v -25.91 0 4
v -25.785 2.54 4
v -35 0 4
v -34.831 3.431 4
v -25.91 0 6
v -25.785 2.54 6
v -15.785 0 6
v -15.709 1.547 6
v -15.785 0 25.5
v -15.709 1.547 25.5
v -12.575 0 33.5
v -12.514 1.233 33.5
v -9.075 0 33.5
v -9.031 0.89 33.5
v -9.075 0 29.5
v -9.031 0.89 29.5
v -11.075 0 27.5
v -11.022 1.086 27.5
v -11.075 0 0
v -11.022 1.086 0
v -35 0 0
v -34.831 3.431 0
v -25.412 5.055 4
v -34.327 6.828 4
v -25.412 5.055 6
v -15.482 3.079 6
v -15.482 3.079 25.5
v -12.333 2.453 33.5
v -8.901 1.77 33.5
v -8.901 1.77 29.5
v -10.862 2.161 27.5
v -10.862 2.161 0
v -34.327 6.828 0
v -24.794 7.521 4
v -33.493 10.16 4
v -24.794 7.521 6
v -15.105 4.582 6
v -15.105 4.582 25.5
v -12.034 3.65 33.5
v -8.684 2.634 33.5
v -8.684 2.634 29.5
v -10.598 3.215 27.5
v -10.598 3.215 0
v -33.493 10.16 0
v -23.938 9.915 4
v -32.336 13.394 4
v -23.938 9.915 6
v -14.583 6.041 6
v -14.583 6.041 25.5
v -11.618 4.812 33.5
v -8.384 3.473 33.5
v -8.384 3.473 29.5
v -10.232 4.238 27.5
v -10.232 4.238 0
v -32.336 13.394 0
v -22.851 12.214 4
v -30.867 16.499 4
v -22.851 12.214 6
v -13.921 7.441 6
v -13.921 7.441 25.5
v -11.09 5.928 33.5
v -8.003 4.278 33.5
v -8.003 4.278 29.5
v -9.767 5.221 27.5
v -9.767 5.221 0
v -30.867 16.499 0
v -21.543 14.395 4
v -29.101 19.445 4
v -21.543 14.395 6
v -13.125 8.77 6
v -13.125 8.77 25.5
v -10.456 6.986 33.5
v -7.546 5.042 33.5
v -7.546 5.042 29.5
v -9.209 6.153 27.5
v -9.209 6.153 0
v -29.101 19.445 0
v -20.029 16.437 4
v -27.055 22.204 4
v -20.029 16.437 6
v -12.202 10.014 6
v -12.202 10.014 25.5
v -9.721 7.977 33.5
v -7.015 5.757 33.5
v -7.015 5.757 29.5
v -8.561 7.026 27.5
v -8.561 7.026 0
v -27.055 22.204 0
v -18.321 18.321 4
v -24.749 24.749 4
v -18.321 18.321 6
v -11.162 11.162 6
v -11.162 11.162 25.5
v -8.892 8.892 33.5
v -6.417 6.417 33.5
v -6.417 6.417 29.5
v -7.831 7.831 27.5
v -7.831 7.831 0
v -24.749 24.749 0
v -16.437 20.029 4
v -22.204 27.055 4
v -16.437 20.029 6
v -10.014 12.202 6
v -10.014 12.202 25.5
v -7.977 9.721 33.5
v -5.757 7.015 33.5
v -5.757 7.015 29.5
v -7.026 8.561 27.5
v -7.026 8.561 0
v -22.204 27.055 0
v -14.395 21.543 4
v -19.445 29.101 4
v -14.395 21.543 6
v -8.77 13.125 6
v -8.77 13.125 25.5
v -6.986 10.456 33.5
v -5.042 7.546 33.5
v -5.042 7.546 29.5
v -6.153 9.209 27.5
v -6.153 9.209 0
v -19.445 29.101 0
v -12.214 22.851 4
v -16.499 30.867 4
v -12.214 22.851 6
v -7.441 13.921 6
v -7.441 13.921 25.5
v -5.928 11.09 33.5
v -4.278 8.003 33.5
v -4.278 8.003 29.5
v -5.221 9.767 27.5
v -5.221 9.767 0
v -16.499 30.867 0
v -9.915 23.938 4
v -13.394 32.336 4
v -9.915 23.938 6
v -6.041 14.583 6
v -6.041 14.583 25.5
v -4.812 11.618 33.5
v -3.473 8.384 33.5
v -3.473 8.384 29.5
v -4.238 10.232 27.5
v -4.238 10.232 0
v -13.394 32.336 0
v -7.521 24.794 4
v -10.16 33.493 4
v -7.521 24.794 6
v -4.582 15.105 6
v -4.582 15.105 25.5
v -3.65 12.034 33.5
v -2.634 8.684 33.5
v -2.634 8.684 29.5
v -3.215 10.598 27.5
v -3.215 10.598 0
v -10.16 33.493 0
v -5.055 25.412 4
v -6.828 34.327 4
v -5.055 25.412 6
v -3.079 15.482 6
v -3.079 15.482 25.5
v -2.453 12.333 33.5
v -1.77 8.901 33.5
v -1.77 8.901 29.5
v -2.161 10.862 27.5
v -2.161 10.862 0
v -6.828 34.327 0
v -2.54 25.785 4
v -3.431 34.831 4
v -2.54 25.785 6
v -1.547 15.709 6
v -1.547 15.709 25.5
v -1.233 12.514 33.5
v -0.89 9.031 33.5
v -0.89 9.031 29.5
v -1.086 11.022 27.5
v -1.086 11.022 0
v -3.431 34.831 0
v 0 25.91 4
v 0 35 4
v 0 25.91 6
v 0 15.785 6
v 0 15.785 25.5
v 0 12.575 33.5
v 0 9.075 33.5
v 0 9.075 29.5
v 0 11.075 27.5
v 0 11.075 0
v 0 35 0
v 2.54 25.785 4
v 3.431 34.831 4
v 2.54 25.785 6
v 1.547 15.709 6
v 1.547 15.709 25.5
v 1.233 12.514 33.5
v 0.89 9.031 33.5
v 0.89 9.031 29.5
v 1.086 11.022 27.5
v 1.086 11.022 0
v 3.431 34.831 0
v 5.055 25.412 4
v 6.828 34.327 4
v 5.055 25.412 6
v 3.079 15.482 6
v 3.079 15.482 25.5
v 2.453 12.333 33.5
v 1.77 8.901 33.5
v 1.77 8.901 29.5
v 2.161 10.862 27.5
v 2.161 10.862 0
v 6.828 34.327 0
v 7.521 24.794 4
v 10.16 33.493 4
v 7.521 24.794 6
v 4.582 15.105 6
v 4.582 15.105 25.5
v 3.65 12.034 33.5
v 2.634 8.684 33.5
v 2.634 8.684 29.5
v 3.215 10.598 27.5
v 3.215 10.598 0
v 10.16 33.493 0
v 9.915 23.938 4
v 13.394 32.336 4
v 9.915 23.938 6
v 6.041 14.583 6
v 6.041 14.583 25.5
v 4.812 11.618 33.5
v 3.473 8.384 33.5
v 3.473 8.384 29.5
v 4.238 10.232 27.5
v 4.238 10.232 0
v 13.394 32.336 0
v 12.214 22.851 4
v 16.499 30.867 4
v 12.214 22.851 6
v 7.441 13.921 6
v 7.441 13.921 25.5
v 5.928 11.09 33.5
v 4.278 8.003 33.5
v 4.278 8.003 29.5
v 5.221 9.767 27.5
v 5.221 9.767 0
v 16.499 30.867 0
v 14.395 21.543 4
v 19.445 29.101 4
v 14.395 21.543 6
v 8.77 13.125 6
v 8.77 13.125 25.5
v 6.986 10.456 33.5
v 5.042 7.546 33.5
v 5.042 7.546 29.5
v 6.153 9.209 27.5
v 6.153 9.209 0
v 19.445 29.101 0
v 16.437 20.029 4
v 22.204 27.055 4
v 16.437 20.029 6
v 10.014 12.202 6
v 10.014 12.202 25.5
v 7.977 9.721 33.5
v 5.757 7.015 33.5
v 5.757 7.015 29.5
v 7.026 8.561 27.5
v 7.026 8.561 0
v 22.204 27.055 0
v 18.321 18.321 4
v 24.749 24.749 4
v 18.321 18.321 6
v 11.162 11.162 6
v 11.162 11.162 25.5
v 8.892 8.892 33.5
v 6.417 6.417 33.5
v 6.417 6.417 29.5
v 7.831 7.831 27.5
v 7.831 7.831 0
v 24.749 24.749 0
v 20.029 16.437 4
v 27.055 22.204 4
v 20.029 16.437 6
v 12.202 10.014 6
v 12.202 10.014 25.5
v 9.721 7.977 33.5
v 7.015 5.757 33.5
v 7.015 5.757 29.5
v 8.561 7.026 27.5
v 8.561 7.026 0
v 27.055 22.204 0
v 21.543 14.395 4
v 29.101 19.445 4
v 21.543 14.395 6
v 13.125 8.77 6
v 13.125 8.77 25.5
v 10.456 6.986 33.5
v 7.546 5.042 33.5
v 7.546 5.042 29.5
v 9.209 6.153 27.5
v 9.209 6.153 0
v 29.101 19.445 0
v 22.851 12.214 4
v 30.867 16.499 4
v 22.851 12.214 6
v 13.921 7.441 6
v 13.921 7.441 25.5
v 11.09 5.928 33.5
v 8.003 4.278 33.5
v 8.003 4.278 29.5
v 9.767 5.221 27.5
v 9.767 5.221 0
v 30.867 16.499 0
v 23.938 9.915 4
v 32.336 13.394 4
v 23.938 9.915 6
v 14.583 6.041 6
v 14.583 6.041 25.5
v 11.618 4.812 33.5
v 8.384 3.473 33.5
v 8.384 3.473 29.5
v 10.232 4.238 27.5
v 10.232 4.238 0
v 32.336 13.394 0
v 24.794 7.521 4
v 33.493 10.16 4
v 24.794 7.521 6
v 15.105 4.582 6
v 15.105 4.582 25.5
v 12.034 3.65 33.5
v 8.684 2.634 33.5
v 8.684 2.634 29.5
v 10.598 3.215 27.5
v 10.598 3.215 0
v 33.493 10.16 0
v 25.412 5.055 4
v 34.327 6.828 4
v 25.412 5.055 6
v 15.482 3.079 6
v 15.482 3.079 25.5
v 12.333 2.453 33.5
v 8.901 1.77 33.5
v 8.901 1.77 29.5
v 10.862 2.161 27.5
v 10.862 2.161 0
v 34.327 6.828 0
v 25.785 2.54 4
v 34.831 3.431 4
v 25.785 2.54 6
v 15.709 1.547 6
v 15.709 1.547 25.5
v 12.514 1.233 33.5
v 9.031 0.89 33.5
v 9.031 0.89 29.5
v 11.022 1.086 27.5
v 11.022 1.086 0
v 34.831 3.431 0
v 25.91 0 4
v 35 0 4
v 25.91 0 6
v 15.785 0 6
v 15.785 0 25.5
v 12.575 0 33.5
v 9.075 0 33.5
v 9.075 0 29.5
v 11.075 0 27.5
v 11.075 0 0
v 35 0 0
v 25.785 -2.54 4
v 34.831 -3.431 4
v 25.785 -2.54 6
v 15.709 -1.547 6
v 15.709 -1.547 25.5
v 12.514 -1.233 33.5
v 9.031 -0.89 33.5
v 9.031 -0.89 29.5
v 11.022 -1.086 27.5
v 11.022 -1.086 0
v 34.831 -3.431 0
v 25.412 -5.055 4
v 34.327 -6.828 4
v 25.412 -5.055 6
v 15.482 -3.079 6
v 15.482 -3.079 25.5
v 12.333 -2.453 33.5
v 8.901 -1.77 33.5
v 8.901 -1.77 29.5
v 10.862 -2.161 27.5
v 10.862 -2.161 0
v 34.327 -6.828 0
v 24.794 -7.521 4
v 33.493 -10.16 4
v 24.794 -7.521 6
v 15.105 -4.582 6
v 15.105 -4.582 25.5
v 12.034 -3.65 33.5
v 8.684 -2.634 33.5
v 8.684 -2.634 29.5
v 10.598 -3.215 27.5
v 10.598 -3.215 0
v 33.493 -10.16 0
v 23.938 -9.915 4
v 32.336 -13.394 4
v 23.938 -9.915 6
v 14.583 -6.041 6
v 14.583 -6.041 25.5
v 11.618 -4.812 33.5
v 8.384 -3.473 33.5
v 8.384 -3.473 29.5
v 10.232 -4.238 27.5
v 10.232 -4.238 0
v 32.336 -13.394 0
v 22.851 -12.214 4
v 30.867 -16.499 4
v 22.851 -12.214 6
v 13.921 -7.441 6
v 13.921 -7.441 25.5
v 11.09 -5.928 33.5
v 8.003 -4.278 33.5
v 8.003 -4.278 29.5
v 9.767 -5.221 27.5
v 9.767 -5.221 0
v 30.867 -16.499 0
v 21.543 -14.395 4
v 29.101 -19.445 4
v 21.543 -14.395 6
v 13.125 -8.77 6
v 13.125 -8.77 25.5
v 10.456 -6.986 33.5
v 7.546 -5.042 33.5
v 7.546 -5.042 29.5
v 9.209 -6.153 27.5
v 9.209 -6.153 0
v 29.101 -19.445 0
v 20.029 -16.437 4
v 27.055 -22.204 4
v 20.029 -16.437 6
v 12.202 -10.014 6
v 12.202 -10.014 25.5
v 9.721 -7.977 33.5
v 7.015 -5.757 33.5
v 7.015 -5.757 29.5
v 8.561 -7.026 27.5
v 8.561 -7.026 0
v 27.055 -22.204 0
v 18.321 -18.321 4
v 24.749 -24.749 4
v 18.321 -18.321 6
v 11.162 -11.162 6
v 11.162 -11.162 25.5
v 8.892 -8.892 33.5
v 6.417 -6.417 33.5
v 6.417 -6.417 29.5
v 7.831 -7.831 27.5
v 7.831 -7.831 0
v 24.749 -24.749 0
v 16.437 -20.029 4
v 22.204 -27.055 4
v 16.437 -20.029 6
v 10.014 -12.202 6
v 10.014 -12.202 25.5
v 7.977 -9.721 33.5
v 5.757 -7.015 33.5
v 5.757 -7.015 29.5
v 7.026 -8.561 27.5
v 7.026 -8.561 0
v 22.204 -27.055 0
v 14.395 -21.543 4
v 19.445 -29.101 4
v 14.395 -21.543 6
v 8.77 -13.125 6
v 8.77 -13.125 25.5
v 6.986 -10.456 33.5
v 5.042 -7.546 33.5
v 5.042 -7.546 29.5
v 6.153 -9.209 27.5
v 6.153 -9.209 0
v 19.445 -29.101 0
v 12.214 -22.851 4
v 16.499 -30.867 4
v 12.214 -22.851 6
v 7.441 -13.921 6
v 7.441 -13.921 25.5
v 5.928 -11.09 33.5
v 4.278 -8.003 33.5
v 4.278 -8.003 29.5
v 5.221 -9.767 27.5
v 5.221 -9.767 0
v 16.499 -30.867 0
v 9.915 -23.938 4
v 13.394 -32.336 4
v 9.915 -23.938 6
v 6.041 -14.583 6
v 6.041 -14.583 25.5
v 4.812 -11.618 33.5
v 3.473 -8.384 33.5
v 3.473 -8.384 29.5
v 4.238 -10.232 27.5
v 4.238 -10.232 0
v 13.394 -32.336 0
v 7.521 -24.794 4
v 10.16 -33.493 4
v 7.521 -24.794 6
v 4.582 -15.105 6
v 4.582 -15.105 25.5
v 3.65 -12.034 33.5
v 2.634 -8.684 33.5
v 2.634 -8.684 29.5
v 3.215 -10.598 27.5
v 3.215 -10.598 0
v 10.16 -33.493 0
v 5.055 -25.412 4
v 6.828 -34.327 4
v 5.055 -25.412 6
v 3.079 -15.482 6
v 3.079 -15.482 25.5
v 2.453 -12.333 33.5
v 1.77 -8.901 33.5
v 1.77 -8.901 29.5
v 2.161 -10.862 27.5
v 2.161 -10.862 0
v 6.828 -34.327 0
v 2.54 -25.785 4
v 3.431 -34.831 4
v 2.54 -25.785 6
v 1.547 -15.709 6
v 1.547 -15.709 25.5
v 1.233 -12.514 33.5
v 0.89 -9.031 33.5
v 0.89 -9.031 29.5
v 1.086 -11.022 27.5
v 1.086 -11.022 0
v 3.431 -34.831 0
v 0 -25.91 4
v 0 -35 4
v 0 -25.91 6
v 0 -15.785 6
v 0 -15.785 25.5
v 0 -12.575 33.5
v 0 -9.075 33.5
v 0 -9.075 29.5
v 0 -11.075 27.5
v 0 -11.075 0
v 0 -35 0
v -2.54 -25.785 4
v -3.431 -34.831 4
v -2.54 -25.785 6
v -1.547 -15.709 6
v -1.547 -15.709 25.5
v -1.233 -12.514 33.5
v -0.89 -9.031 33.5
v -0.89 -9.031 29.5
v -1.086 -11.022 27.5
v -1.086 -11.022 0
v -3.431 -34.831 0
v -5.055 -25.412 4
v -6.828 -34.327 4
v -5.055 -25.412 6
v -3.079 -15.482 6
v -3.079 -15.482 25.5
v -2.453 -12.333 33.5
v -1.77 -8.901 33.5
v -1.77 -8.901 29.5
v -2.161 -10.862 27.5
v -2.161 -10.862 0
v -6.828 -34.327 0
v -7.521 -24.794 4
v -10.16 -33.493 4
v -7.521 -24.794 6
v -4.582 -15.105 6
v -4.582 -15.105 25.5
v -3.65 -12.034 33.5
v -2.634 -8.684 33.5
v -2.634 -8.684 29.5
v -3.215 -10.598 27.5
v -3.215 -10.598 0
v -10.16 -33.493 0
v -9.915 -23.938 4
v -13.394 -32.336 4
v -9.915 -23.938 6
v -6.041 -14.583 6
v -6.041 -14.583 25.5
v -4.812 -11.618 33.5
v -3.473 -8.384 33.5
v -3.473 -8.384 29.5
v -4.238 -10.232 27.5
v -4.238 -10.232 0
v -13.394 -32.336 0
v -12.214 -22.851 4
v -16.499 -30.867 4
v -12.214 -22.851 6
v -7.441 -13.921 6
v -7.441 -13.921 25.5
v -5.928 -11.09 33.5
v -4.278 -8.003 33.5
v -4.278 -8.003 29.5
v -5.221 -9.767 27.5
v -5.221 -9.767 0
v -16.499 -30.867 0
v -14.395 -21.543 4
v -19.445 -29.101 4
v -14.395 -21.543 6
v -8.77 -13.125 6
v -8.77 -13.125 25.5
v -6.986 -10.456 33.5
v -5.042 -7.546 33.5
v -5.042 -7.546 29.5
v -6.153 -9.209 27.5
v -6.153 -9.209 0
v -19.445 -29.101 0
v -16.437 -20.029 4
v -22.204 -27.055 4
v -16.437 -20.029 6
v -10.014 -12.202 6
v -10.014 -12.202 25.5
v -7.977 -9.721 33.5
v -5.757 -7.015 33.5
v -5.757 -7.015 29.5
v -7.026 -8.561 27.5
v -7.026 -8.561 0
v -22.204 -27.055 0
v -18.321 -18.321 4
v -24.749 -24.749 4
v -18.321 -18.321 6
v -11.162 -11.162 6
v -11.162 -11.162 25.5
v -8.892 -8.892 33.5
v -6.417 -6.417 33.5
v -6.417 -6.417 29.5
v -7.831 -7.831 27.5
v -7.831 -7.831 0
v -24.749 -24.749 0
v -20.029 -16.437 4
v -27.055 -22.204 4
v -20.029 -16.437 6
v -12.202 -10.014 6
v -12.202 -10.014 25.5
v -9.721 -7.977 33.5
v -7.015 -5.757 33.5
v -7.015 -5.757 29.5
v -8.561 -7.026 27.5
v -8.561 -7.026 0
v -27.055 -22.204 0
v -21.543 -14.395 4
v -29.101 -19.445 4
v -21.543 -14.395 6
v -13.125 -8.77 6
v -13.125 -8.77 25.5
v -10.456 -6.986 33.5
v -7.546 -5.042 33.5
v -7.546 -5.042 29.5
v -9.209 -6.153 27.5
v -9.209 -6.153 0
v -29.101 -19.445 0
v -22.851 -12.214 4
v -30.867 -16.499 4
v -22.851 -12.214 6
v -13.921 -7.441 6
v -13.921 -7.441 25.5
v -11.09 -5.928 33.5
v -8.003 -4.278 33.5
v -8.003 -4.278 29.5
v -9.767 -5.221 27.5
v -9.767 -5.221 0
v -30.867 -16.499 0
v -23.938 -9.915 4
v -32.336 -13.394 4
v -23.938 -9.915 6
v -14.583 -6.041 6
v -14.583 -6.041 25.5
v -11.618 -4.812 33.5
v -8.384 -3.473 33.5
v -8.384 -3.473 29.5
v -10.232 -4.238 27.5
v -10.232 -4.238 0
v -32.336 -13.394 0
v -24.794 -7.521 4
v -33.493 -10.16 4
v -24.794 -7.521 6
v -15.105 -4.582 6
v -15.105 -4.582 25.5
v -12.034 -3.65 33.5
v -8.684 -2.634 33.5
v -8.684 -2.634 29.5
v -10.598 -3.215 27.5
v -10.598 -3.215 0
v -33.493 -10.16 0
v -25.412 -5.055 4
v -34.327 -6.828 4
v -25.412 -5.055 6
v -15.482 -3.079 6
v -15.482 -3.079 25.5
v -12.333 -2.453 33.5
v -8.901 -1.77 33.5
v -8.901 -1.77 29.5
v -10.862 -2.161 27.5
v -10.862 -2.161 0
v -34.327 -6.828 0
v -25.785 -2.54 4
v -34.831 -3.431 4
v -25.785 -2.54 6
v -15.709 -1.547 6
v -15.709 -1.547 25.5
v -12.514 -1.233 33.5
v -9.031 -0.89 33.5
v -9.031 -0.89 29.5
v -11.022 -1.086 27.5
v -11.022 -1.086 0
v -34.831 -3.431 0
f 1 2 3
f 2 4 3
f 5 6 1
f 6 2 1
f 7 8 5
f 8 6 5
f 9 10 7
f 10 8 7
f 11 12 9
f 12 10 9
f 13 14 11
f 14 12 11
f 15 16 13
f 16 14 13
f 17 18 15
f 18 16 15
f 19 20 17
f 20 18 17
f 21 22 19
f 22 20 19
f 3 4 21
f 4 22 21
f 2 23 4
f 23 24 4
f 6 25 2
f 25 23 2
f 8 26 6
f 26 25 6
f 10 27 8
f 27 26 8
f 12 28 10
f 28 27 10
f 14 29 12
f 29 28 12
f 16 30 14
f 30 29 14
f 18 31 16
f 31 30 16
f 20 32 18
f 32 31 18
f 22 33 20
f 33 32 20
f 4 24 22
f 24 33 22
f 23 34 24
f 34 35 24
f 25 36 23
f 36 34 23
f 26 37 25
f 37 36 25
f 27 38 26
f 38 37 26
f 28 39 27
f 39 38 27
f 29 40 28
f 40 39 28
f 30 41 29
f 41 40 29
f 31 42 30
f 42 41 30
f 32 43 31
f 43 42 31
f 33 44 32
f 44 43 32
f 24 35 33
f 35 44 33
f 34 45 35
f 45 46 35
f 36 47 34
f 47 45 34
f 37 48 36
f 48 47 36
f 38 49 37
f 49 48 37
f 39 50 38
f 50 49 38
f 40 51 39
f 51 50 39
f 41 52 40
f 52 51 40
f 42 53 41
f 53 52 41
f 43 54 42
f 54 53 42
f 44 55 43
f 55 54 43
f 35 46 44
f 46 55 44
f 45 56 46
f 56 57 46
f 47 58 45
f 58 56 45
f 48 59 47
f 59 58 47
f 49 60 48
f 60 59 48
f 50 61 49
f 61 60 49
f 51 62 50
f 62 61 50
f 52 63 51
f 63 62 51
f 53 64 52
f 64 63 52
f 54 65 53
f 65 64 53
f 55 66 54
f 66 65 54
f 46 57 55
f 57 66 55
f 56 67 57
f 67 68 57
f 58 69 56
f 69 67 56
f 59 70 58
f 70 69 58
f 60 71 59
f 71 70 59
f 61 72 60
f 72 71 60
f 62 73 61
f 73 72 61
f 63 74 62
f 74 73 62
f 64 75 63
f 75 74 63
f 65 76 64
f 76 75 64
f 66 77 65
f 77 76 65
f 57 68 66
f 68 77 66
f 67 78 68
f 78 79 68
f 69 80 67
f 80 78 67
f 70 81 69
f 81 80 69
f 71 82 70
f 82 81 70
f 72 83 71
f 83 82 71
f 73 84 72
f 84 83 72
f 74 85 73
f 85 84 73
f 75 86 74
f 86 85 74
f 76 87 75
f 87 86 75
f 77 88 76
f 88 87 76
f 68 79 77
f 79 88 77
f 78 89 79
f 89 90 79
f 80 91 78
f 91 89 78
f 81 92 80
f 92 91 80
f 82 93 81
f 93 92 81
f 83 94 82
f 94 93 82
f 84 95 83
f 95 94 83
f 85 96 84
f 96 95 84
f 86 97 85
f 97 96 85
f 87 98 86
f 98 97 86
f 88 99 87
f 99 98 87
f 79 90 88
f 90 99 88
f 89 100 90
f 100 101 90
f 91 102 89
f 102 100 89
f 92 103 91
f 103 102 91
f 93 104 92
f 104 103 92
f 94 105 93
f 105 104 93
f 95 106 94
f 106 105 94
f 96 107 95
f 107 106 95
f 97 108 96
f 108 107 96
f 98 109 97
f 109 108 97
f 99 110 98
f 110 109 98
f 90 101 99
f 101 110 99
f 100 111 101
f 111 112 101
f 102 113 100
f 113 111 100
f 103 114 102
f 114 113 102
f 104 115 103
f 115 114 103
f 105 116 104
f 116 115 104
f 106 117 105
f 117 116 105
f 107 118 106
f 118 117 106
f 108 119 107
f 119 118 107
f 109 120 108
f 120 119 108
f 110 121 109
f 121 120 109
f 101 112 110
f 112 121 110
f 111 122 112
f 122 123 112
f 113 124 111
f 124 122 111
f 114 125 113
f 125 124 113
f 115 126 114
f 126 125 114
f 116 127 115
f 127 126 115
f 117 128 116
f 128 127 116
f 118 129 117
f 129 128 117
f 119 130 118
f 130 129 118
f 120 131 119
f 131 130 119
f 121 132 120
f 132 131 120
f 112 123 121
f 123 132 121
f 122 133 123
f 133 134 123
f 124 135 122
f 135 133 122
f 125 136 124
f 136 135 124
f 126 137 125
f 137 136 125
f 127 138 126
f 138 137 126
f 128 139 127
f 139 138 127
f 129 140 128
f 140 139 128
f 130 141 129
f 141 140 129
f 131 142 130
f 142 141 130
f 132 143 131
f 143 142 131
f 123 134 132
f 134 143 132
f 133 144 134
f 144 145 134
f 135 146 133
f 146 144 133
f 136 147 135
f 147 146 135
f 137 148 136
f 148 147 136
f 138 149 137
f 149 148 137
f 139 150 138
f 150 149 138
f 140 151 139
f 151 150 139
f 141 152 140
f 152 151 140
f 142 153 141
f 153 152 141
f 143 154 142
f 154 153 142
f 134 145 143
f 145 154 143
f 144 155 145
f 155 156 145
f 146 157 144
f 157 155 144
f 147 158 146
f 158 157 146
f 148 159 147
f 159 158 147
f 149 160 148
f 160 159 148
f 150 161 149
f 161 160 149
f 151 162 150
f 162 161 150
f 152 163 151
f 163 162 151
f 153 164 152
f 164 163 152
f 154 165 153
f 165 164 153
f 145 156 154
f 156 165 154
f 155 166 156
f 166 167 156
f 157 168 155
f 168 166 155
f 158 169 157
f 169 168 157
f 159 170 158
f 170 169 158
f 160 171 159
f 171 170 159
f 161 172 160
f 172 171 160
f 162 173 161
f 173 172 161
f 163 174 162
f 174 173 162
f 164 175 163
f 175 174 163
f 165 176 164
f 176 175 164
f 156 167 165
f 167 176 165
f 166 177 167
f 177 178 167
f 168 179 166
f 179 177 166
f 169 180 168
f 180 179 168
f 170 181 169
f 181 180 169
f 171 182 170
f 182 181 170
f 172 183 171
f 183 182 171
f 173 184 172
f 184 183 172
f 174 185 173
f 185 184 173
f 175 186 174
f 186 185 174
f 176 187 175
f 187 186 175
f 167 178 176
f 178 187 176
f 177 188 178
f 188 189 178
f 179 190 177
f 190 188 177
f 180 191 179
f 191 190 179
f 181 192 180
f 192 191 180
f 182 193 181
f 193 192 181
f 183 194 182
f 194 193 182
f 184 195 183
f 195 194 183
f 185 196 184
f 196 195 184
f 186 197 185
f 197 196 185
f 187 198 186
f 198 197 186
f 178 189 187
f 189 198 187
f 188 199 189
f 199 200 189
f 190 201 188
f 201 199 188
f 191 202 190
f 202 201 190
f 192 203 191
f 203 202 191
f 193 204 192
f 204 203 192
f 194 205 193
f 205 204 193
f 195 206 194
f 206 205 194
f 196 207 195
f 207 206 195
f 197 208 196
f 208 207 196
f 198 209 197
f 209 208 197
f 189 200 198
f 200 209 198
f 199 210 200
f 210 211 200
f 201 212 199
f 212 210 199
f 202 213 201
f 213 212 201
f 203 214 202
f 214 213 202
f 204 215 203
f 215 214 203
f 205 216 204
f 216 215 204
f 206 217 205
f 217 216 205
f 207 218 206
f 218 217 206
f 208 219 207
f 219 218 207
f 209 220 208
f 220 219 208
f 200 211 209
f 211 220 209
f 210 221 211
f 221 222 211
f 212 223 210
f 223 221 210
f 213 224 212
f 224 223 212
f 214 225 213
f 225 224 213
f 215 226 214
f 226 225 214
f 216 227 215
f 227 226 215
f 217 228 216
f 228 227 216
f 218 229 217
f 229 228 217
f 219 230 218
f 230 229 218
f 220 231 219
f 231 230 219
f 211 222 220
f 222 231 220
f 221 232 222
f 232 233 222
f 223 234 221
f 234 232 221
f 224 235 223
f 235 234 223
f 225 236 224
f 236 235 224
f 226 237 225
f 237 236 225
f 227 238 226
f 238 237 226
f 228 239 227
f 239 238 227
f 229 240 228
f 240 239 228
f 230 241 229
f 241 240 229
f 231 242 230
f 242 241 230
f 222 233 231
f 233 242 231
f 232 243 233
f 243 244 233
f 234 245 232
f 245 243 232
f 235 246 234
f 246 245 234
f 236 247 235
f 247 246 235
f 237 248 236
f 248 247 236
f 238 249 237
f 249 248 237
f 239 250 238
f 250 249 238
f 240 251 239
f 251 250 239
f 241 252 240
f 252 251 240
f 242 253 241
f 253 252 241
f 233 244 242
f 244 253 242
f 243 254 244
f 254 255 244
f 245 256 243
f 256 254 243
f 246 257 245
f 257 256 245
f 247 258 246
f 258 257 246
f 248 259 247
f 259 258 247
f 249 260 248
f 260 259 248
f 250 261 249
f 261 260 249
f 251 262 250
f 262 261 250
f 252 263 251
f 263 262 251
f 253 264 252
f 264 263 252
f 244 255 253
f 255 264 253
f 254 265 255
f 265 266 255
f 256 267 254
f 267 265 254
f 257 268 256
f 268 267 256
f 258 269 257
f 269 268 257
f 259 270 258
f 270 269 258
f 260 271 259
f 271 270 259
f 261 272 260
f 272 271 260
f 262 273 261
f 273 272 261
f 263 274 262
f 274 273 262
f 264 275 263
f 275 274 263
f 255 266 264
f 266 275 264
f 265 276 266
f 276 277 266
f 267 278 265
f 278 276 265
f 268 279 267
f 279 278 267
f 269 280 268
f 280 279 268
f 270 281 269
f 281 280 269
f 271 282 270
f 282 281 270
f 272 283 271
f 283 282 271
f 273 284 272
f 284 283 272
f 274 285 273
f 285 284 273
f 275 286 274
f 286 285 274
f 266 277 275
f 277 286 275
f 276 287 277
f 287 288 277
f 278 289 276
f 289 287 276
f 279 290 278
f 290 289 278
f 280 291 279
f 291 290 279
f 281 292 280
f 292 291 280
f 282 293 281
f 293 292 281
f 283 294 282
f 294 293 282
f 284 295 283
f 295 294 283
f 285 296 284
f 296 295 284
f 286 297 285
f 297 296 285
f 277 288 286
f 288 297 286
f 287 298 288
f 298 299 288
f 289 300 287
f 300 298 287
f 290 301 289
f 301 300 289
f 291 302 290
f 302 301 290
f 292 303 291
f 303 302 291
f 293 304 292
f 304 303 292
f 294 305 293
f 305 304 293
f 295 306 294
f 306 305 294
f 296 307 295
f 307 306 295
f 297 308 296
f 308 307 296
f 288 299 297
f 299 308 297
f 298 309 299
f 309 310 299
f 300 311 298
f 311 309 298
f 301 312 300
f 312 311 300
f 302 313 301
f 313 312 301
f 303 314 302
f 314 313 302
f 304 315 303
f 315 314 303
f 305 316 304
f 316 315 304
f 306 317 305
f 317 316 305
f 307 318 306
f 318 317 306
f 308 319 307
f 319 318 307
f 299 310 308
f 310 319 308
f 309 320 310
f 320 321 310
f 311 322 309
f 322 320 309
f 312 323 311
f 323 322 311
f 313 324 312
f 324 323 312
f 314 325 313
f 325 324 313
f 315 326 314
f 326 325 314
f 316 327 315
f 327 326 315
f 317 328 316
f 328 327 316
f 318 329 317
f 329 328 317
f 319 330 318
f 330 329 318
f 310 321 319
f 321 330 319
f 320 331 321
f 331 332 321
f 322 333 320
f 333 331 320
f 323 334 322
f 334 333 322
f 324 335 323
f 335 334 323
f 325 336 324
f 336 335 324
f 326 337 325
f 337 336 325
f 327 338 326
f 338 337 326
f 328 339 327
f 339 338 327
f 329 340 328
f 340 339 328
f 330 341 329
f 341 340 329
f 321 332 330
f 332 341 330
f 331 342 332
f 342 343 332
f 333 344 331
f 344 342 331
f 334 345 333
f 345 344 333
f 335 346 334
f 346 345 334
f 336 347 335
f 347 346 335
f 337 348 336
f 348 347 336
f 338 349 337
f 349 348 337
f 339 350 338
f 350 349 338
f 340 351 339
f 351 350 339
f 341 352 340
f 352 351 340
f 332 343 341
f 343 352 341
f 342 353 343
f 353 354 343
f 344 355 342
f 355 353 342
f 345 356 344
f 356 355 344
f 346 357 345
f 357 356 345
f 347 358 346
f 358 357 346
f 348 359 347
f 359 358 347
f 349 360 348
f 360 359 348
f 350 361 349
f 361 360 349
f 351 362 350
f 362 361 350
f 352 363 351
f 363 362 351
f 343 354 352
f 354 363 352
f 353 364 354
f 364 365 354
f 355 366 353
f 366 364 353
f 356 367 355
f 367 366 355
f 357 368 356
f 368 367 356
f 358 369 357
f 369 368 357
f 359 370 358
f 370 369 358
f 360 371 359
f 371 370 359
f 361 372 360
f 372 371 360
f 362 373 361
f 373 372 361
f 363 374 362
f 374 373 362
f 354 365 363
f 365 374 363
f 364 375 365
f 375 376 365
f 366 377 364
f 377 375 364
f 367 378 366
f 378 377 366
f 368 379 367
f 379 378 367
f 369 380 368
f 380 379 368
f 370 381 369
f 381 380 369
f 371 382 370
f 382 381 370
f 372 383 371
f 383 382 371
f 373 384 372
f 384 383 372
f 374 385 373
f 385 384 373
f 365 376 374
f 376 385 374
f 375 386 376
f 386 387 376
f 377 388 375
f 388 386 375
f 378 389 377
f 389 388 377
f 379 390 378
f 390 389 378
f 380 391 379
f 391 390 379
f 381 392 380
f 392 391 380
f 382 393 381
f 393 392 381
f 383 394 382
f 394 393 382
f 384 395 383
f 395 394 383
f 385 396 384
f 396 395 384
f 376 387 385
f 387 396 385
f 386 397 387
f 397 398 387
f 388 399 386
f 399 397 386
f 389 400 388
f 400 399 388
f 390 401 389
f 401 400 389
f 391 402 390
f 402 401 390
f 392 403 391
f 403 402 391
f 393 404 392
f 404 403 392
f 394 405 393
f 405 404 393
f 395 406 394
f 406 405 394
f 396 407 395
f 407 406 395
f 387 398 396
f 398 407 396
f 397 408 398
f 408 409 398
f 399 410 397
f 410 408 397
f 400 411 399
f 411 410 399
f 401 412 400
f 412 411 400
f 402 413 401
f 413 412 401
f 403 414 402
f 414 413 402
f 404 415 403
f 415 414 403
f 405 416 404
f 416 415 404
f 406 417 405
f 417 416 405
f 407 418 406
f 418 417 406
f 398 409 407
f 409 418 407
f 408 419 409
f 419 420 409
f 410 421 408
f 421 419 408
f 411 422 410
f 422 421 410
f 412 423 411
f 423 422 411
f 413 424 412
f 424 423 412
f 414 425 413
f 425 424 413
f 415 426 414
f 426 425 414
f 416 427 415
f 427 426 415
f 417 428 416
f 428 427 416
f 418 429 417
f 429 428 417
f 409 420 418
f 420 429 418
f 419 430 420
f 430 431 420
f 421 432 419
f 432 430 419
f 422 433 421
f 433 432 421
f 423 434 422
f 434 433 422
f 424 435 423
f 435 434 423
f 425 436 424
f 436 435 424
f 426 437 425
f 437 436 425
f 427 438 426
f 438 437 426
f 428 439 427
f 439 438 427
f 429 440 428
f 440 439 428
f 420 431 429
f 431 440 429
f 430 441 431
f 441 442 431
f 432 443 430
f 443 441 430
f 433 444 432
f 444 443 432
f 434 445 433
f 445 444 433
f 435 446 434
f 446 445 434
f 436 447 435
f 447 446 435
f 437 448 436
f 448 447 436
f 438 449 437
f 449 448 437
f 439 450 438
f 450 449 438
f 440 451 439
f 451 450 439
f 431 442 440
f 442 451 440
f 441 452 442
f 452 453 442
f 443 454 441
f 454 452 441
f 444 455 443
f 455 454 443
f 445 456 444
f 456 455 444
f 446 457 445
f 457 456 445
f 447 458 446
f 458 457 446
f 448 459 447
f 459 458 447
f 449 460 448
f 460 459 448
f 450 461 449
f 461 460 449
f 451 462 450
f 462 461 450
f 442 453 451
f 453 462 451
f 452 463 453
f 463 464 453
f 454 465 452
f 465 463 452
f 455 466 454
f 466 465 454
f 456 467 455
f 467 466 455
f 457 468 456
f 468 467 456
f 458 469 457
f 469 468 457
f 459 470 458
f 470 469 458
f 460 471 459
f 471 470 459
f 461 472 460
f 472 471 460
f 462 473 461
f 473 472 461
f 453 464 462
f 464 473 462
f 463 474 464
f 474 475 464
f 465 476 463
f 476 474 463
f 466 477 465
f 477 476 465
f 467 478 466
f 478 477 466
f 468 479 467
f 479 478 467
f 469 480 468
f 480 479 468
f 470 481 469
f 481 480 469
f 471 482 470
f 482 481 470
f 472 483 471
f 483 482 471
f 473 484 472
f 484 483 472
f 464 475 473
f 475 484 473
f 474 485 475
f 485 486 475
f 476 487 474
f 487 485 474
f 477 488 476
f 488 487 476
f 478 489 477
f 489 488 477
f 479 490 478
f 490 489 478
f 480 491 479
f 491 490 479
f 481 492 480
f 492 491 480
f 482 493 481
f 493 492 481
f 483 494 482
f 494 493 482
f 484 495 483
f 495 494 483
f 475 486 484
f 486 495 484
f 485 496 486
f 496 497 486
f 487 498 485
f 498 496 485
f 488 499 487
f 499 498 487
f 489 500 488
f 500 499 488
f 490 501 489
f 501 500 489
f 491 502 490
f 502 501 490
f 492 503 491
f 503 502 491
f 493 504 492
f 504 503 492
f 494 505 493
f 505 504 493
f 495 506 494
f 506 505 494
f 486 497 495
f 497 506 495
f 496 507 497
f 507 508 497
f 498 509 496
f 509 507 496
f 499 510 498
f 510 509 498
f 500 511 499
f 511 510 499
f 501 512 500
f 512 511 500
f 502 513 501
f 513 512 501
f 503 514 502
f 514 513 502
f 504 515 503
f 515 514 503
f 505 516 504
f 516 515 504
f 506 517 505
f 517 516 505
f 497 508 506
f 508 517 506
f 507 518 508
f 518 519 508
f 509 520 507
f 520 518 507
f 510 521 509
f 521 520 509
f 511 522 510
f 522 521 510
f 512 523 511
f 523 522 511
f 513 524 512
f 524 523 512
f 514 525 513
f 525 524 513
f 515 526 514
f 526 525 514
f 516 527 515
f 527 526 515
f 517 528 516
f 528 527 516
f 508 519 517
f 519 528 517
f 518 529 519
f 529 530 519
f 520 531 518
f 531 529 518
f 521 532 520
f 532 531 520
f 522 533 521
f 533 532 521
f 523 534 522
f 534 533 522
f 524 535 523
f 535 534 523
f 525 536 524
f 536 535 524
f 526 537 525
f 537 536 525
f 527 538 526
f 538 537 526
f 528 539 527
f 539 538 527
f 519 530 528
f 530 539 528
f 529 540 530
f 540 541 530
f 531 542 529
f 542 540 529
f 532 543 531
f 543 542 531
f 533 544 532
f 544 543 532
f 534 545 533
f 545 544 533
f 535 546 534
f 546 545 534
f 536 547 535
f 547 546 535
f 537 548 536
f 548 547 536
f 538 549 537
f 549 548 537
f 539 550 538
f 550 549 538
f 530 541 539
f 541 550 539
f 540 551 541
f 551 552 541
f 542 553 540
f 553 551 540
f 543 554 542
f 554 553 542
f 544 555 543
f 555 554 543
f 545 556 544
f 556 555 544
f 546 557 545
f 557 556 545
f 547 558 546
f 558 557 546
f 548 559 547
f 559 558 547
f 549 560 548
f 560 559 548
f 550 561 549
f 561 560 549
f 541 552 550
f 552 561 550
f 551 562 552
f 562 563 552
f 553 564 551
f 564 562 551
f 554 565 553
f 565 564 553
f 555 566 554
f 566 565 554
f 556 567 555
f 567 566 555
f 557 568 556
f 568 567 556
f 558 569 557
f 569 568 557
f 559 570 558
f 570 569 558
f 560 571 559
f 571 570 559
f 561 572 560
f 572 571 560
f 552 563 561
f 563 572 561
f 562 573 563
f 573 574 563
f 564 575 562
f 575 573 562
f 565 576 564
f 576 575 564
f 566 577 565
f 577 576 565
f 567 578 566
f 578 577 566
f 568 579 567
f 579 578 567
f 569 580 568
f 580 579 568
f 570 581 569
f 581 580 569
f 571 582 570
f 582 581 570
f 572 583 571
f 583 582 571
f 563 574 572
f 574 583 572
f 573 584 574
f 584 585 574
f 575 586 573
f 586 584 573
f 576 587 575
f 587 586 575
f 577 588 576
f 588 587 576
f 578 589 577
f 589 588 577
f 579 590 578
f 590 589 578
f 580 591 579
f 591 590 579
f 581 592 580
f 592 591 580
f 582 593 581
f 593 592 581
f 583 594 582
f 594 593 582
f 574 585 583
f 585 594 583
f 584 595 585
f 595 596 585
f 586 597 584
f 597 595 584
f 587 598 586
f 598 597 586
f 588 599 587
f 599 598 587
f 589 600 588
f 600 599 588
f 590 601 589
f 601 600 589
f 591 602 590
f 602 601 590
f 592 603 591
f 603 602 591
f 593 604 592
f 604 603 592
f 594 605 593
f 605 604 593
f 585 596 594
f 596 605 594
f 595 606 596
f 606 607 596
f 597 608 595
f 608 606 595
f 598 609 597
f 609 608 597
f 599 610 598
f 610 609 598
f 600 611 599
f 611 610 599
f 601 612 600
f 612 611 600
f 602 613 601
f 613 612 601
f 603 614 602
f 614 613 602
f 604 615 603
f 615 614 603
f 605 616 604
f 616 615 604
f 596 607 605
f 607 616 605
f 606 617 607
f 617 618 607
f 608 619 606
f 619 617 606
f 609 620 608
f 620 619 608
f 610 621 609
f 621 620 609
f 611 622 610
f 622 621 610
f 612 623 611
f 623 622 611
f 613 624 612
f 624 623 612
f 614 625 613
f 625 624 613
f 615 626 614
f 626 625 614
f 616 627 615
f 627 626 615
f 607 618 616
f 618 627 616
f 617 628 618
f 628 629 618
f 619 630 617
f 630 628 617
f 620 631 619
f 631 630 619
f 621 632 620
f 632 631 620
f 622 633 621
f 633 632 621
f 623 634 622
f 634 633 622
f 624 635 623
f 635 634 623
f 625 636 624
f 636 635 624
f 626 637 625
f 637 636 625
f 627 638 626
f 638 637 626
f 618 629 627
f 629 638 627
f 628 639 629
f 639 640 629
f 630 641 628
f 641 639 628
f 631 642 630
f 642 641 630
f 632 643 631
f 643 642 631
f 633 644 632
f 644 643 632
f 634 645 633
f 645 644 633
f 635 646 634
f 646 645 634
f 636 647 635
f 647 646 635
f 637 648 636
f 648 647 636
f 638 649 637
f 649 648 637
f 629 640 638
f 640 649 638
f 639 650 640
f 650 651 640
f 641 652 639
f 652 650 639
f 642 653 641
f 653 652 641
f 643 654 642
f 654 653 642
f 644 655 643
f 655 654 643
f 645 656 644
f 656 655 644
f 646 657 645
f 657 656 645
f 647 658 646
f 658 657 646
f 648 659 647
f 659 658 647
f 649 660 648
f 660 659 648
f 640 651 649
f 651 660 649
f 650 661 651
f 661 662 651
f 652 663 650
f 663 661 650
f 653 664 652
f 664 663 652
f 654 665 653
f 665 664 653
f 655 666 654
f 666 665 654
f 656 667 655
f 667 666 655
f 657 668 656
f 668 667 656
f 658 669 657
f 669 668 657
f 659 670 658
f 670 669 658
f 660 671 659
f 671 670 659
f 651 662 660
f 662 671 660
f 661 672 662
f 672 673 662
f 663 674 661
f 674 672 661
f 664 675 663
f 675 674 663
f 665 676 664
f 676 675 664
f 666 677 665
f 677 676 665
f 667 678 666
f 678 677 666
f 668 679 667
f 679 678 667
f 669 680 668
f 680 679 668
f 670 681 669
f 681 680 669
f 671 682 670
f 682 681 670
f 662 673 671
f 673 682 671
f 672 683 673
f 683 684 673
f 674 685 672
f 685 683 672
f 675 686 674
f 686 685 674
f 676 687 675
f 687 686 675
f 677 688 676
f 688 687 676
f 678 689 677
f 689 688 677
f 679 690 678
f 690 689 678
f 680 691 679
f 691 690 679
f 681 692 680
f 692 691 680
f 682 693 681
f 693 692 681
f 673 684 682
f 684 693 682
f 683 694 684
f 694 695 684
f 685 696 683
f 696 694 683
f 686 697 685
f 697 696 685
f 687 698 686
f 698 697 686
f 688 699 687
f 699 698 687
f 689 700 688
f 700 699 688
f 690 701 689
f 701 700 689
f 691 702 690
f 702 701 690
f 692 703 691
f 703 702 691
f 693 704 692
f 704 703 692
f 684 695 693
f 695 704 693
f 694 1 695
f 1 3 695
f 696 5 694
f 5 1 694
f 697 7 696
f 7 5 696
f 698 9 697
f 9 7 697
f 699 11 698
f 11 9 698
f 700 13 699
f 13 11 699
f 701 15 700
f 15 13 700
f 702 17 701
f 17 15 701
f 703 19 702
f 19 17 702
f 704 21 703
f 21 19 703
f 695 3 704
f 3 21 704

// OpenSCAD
// Holds two spools in a vertical position.  Meant to be a tight slip or mild press fit into 608 bearings.

bearing_ir = (22 + 0.15)/2;
bearing_h = 7;

spacer_height = 15;

flange_r = 70/2;
// Spool diameters:
spool_dia_matterhackers = 31.75 - 0.18;
spool_dia_protoparadigm = 52 - 0.18;
spool_r_big = spool_dia_protoparadigm/2;
spool_r_small = spool_dia_matterhackers/2;

inner_h = (2 * bearing_h) + spacer_height - 1.5;  // Height at which taper begins.
inner_r = bearing_ir - 2;

lip_thickness = 4;
step_thickness = 2;

overhang = bearing_ir - inner_r;
overhang_height = 4;

$fn = 64;

echo("inner_h", inner_h);

difference() {
	rotate_extrude() {
		polygon( [   [bearing_ir, 0],
			    		[bearing_ir, inner_h],
					[inner_r, inner_h + overhang],
					[inner_r, inner_h + overhang + overhang_height],
					[bearing_ir + 1.5, inner_h + overhang + overhang_height],
					[spool_r_small, inner_h + overhang - 4],
					[spool_r_small, step_thickness + lip_thickness],
					[spool_r_big, step_thickness + lip_thickness],
					[spool_r_big, lip_thickness],
					[flange_r, lip_thickness],
					[flange_r, 0]
				 ] );
	}
	// uncomment below to generate a cutaway view
	//translate([0, 0, -1]) cube([50, 50, 100]);
}
